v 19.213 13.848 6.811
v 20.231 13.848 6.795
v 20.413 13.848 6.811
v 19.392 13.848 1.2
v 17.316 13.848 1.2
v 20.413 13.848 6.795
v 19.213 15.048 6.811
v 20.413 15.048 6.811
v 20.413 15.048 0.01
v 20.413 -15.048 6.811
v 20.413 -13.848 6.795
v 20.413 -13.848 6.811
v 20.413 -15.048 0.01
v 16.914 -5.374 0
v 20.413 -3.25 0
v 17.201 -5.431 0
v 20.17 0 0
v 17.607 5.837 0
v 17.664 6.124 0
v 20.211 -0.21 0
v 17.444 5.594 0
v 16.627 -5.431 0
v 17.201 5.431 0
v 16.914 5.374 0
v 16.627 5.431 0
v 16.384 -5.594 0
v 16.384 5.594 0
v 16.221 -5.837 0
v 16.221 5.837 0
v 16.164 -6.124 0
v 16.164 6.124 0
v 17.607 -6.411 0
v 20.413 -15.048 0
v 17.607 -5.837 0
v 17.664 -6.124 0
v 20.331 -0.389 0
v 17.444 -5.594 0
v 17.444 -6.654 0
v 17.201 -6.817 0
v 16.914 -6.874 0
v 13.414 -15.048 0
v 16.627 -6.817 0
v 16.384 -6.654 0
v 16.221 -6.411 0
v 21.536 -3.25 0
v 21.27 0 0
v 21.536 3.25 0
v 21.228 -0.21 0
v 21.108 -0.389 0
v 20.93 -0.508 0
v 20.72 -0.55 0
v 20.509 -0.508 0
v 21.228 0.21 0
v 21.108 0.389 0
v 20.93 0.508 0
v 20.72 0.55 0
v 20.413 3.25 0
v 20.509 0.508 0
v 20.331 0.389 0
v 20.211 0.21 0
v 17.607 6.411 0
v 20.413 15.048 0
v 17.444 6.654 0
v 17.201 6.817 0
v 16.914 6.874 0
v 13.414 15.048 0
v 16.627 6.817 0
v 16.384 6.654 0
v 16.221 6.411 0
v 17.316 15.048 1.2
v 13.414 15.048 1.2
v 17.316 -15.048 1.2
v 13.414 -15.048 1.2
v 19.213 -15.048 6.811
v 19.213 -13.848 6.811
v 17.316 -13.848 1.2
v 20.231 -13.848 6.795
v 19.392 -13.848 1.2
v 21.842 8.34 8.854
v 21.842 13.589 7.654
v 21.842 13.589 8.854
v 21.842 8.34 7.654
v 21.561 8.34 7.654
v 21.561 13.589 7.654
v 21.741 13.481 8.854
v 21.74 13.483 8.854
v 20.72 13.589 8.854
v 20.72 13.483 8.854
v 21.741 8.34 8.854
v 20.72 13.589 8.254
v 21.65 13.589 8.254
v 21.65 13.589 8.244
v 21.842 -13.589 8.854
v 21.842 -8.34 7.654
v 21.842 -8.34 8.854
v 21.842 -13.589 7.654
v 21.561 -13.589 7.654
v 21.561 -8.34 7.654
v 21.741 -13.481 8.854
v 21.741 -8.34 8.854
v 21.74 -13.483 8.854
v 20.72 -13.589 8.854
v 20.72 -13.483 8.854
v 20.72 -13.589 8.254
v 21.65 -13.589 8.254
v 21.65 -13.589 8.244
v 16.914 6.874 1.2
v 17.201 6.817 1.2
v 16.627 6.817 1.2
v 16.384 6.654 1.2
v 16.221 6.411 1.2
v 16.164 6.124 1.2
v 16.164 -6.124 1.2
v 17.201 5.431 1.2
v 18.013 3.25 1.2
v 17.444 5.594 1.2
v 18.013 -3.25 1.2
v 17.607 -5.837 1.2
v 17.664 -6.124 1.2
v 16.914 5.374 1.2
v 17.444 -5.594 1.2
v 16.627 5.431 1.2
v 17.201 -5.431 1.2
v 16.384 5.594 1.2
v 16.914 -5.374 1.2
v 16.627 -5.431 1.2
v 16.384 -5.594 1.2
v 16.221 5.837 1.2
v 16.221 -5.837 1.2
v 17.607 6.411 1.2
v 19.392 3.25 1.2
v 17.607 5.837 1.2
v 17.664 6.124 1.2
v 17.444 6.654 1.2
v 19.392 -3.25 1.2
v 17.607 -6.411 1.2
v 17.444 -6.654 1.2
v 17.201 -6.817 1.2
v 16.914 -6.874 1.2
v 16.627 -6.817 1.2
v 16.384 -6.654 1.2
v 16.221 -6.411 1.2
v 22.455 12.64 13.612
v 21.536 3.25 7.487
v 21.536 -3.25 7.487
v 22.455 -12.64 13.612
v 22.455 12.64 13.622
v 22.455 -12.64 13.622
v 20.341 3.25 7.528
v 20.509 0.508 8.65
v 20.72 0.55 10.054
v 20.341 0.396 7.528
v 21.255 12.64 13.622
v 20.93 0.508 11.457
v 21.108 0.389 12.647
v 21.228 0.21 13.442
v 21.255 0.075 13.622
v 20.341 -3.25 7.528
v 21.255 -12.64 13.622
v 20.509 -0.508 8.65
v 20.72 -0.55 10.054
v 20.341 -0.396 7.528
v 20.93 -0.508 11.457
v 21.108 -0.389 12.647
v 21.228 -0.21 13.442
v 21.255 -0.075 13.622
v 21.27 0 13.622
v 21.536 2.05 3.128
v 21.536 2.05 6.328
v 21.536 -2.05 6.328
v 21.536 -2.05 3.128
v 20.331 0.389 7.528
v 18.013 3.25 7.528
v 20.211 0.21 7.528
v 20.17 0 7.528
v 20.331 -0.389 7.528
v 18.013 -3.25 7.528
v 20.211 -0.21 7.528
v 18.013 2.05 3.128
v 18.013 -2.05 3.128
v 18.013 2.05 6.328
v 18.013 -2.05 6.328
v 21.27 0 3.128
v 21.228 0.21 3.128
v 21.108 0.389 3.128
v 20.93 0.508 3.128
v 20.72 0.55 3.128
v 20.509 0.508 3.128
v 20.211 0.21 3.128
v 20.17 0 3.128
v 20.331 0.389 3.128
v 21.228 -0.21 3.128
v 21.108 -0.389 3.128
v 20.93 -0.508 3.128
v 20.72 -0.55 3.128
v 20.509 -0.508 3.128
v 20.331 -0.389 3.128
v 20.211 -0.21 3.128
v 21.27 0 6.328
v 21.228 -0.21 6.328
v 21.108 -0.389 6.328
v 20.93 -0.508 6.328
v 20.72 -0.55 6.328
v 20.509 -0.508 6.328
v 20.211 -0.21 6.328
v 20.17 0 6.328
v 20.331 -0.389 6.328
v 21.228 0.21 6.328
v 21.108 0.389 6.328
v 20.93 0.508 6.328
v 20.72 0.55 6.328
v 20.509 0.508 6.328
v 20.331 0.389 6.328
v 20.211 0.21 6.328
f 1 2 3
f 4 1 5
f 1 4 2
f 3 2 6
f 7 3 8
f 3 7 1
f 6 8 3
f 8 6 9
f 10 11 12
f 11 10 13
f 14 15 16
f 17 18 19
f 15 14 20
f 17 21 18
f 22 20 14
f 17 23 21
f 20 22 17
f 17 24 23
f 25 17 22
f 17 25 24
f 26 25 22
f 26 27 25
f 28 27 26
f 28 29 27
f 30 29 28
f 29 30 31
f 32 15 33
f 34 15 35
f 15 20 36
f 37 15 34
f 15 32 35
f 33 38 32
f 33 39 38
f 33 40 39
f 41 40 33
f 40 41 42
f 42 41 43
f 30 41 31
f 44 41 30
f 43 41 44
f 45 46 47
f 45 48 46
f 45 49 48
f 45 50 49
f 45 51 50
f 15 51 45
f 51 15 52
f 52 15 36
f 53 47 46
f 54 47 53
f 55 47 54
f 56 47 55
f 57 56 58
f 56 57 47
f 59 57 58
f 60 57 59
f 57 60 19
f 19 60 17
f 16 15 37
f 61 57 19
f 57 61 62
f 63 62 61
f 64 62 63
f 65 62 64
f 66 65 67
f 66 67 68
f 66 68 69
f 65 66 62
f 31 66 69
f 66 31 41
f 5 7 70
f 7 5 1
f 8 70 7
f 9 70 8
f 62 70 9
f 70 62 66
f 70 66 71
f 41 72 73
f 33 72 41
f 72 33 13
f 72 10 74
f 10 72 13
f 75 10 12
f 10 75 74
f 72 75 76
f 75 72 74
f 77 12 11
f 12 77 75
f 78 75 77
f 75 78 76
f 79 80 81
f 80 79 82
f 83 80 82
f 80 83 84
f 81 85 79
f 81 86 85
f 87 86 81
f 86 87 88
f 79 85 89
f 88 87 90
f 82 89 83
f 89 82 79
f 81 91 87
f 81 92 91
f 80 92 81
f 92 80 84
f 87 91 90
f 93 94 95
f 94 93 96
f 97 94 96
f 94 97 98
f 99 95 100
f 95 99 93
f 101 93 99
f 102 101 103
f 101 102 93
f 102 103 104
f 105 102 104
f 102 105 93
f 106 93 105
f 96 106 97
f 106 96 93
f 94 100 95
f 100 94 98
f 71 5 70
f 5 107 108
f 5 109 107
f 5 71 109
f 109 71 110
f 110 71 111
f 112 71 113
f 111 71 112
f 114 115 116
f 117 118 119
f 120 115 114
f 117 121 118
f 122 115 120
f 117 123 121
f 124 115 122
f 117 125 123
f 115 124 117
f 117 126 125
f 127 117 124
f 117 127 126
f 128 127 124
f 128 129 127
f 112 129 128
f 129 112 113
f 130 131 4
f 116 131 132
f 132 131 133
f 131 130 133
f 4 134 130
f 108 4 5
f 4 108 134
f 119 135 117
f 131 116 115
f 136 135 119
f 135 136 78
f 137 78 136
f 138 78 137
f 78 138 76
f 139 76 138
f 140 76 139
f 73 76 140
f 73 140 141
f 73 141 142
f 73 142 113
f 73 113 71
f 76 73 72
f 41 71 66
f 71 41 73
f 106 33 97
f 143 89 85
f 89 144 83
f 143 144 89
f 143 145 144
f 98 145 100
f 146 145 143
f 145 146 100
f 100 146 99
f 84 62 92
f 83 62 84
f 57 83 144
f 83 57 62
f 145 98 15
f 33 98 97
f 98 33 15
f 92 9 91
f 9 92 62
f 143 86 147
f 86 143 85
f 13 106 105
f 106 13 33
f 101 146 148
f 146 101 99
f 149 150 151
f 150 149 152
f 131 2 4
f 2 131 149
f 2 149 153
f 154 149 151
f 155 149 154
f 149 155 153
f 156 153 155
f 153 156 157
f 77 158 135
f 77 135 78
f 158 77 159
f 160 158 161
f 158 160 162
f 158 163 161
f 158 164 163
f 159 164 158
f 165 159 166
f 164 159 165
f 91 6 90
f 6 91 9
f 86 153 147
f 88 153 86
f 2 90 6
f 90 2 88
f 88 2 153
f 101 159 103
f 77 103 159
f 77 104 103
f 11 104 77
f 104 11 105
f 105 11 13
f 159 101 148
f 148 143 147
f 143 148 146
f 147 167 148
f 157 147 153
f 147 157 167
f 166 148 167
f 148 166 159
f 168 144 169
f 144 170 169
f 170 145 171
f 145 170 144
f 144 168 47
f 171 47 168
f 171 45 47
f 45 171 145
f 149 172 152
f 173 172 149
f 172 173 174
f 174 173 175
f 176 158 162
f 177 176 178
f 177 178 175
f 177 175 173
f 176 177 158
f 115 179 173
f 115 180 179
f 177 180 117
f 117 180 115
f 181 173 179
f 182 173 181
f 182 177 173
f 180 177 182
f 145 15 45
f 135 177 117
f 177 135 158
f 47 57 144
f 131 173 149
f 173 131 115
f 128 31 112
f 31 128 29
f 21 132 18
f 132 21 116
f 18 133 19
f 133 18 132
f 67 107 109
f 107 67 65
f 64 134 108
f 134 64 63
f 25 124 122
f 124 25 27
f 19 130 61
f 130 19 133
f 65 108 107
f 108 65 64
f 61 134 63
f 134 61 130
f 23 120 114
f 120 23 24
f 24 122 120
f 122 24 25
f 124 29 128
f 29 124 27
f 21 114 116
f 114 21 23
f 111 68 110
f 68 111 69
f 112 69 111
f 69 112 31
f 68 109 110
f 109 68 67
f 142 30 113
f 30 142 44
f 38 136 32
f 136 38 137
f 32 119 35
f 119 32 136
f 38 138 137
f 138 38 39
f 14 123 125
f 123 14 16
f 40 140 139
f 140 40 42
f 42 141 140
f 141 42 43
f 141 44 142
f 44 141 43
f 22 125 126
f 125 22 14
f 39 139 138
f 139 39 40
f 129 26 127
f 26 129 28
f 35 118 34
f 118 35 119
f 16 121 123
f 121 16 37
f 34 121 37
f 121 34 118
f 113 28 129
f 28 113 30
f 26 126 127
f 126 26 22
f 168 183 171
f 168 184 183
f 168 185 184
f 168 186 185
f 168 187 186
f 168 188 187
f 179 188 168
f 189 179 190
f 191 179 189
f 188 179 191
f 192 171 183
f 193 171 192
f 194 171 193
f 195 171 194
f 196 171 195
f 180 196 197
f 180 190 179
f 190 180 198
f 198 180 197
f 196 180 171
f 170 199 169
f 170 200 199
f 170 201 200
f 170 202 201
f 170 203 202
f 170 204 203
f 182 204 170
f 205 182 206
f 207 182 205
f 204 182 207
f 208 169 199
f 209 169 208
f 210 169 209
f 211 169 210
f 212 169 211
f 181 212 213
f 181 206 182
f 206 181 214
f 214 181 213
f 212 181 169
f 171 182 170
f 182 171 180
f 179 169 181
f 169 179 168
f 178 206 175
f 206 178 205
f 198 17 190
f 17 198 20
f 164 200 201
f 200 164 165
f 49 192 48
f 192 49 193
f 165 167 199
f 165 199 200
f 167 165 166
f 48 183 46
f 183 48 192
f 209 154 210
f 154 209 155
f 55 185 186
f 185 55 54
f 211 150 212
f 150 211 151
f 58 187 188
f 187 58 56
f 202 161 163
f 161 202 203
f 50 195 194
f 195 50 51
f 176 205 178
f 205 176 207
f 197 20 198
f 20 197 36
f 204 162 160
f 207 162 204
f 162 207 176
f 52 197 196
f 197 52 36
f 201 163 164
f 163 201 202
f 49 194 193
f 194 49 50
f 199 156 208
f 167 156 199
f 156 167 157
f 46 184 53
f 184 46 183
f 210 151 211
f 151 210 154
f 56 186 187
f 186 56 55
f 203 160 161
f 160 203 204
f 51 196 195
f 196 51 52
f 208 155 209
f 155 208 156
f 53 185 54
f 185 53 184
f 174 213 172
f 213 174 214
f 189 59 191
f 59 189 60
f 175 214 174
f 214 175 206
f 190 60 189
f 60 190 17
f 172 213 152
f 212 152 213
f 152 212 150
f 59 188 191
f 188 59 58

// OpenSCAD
// Milwaukee Road Little Joe, HO scale 1-87 - print 9 of 11: pilot - pilot with coupler pocket - print 2
// Render (F6), export STL, print. Settings: ../../library/lj_params.scad
// Whole loco preview and notes: ../../MILW_LittleJoe_Main.scad
SCALE_SEL = "HO";
LOCO_SEL = "E70";   // [E20, E21, E70, E71, E72, E73, E74, E75, E76, E77, E78, E79] the body and roof change for E20 / E21
include <../../library/lj_all.scad>
lj_plate("pilot");
